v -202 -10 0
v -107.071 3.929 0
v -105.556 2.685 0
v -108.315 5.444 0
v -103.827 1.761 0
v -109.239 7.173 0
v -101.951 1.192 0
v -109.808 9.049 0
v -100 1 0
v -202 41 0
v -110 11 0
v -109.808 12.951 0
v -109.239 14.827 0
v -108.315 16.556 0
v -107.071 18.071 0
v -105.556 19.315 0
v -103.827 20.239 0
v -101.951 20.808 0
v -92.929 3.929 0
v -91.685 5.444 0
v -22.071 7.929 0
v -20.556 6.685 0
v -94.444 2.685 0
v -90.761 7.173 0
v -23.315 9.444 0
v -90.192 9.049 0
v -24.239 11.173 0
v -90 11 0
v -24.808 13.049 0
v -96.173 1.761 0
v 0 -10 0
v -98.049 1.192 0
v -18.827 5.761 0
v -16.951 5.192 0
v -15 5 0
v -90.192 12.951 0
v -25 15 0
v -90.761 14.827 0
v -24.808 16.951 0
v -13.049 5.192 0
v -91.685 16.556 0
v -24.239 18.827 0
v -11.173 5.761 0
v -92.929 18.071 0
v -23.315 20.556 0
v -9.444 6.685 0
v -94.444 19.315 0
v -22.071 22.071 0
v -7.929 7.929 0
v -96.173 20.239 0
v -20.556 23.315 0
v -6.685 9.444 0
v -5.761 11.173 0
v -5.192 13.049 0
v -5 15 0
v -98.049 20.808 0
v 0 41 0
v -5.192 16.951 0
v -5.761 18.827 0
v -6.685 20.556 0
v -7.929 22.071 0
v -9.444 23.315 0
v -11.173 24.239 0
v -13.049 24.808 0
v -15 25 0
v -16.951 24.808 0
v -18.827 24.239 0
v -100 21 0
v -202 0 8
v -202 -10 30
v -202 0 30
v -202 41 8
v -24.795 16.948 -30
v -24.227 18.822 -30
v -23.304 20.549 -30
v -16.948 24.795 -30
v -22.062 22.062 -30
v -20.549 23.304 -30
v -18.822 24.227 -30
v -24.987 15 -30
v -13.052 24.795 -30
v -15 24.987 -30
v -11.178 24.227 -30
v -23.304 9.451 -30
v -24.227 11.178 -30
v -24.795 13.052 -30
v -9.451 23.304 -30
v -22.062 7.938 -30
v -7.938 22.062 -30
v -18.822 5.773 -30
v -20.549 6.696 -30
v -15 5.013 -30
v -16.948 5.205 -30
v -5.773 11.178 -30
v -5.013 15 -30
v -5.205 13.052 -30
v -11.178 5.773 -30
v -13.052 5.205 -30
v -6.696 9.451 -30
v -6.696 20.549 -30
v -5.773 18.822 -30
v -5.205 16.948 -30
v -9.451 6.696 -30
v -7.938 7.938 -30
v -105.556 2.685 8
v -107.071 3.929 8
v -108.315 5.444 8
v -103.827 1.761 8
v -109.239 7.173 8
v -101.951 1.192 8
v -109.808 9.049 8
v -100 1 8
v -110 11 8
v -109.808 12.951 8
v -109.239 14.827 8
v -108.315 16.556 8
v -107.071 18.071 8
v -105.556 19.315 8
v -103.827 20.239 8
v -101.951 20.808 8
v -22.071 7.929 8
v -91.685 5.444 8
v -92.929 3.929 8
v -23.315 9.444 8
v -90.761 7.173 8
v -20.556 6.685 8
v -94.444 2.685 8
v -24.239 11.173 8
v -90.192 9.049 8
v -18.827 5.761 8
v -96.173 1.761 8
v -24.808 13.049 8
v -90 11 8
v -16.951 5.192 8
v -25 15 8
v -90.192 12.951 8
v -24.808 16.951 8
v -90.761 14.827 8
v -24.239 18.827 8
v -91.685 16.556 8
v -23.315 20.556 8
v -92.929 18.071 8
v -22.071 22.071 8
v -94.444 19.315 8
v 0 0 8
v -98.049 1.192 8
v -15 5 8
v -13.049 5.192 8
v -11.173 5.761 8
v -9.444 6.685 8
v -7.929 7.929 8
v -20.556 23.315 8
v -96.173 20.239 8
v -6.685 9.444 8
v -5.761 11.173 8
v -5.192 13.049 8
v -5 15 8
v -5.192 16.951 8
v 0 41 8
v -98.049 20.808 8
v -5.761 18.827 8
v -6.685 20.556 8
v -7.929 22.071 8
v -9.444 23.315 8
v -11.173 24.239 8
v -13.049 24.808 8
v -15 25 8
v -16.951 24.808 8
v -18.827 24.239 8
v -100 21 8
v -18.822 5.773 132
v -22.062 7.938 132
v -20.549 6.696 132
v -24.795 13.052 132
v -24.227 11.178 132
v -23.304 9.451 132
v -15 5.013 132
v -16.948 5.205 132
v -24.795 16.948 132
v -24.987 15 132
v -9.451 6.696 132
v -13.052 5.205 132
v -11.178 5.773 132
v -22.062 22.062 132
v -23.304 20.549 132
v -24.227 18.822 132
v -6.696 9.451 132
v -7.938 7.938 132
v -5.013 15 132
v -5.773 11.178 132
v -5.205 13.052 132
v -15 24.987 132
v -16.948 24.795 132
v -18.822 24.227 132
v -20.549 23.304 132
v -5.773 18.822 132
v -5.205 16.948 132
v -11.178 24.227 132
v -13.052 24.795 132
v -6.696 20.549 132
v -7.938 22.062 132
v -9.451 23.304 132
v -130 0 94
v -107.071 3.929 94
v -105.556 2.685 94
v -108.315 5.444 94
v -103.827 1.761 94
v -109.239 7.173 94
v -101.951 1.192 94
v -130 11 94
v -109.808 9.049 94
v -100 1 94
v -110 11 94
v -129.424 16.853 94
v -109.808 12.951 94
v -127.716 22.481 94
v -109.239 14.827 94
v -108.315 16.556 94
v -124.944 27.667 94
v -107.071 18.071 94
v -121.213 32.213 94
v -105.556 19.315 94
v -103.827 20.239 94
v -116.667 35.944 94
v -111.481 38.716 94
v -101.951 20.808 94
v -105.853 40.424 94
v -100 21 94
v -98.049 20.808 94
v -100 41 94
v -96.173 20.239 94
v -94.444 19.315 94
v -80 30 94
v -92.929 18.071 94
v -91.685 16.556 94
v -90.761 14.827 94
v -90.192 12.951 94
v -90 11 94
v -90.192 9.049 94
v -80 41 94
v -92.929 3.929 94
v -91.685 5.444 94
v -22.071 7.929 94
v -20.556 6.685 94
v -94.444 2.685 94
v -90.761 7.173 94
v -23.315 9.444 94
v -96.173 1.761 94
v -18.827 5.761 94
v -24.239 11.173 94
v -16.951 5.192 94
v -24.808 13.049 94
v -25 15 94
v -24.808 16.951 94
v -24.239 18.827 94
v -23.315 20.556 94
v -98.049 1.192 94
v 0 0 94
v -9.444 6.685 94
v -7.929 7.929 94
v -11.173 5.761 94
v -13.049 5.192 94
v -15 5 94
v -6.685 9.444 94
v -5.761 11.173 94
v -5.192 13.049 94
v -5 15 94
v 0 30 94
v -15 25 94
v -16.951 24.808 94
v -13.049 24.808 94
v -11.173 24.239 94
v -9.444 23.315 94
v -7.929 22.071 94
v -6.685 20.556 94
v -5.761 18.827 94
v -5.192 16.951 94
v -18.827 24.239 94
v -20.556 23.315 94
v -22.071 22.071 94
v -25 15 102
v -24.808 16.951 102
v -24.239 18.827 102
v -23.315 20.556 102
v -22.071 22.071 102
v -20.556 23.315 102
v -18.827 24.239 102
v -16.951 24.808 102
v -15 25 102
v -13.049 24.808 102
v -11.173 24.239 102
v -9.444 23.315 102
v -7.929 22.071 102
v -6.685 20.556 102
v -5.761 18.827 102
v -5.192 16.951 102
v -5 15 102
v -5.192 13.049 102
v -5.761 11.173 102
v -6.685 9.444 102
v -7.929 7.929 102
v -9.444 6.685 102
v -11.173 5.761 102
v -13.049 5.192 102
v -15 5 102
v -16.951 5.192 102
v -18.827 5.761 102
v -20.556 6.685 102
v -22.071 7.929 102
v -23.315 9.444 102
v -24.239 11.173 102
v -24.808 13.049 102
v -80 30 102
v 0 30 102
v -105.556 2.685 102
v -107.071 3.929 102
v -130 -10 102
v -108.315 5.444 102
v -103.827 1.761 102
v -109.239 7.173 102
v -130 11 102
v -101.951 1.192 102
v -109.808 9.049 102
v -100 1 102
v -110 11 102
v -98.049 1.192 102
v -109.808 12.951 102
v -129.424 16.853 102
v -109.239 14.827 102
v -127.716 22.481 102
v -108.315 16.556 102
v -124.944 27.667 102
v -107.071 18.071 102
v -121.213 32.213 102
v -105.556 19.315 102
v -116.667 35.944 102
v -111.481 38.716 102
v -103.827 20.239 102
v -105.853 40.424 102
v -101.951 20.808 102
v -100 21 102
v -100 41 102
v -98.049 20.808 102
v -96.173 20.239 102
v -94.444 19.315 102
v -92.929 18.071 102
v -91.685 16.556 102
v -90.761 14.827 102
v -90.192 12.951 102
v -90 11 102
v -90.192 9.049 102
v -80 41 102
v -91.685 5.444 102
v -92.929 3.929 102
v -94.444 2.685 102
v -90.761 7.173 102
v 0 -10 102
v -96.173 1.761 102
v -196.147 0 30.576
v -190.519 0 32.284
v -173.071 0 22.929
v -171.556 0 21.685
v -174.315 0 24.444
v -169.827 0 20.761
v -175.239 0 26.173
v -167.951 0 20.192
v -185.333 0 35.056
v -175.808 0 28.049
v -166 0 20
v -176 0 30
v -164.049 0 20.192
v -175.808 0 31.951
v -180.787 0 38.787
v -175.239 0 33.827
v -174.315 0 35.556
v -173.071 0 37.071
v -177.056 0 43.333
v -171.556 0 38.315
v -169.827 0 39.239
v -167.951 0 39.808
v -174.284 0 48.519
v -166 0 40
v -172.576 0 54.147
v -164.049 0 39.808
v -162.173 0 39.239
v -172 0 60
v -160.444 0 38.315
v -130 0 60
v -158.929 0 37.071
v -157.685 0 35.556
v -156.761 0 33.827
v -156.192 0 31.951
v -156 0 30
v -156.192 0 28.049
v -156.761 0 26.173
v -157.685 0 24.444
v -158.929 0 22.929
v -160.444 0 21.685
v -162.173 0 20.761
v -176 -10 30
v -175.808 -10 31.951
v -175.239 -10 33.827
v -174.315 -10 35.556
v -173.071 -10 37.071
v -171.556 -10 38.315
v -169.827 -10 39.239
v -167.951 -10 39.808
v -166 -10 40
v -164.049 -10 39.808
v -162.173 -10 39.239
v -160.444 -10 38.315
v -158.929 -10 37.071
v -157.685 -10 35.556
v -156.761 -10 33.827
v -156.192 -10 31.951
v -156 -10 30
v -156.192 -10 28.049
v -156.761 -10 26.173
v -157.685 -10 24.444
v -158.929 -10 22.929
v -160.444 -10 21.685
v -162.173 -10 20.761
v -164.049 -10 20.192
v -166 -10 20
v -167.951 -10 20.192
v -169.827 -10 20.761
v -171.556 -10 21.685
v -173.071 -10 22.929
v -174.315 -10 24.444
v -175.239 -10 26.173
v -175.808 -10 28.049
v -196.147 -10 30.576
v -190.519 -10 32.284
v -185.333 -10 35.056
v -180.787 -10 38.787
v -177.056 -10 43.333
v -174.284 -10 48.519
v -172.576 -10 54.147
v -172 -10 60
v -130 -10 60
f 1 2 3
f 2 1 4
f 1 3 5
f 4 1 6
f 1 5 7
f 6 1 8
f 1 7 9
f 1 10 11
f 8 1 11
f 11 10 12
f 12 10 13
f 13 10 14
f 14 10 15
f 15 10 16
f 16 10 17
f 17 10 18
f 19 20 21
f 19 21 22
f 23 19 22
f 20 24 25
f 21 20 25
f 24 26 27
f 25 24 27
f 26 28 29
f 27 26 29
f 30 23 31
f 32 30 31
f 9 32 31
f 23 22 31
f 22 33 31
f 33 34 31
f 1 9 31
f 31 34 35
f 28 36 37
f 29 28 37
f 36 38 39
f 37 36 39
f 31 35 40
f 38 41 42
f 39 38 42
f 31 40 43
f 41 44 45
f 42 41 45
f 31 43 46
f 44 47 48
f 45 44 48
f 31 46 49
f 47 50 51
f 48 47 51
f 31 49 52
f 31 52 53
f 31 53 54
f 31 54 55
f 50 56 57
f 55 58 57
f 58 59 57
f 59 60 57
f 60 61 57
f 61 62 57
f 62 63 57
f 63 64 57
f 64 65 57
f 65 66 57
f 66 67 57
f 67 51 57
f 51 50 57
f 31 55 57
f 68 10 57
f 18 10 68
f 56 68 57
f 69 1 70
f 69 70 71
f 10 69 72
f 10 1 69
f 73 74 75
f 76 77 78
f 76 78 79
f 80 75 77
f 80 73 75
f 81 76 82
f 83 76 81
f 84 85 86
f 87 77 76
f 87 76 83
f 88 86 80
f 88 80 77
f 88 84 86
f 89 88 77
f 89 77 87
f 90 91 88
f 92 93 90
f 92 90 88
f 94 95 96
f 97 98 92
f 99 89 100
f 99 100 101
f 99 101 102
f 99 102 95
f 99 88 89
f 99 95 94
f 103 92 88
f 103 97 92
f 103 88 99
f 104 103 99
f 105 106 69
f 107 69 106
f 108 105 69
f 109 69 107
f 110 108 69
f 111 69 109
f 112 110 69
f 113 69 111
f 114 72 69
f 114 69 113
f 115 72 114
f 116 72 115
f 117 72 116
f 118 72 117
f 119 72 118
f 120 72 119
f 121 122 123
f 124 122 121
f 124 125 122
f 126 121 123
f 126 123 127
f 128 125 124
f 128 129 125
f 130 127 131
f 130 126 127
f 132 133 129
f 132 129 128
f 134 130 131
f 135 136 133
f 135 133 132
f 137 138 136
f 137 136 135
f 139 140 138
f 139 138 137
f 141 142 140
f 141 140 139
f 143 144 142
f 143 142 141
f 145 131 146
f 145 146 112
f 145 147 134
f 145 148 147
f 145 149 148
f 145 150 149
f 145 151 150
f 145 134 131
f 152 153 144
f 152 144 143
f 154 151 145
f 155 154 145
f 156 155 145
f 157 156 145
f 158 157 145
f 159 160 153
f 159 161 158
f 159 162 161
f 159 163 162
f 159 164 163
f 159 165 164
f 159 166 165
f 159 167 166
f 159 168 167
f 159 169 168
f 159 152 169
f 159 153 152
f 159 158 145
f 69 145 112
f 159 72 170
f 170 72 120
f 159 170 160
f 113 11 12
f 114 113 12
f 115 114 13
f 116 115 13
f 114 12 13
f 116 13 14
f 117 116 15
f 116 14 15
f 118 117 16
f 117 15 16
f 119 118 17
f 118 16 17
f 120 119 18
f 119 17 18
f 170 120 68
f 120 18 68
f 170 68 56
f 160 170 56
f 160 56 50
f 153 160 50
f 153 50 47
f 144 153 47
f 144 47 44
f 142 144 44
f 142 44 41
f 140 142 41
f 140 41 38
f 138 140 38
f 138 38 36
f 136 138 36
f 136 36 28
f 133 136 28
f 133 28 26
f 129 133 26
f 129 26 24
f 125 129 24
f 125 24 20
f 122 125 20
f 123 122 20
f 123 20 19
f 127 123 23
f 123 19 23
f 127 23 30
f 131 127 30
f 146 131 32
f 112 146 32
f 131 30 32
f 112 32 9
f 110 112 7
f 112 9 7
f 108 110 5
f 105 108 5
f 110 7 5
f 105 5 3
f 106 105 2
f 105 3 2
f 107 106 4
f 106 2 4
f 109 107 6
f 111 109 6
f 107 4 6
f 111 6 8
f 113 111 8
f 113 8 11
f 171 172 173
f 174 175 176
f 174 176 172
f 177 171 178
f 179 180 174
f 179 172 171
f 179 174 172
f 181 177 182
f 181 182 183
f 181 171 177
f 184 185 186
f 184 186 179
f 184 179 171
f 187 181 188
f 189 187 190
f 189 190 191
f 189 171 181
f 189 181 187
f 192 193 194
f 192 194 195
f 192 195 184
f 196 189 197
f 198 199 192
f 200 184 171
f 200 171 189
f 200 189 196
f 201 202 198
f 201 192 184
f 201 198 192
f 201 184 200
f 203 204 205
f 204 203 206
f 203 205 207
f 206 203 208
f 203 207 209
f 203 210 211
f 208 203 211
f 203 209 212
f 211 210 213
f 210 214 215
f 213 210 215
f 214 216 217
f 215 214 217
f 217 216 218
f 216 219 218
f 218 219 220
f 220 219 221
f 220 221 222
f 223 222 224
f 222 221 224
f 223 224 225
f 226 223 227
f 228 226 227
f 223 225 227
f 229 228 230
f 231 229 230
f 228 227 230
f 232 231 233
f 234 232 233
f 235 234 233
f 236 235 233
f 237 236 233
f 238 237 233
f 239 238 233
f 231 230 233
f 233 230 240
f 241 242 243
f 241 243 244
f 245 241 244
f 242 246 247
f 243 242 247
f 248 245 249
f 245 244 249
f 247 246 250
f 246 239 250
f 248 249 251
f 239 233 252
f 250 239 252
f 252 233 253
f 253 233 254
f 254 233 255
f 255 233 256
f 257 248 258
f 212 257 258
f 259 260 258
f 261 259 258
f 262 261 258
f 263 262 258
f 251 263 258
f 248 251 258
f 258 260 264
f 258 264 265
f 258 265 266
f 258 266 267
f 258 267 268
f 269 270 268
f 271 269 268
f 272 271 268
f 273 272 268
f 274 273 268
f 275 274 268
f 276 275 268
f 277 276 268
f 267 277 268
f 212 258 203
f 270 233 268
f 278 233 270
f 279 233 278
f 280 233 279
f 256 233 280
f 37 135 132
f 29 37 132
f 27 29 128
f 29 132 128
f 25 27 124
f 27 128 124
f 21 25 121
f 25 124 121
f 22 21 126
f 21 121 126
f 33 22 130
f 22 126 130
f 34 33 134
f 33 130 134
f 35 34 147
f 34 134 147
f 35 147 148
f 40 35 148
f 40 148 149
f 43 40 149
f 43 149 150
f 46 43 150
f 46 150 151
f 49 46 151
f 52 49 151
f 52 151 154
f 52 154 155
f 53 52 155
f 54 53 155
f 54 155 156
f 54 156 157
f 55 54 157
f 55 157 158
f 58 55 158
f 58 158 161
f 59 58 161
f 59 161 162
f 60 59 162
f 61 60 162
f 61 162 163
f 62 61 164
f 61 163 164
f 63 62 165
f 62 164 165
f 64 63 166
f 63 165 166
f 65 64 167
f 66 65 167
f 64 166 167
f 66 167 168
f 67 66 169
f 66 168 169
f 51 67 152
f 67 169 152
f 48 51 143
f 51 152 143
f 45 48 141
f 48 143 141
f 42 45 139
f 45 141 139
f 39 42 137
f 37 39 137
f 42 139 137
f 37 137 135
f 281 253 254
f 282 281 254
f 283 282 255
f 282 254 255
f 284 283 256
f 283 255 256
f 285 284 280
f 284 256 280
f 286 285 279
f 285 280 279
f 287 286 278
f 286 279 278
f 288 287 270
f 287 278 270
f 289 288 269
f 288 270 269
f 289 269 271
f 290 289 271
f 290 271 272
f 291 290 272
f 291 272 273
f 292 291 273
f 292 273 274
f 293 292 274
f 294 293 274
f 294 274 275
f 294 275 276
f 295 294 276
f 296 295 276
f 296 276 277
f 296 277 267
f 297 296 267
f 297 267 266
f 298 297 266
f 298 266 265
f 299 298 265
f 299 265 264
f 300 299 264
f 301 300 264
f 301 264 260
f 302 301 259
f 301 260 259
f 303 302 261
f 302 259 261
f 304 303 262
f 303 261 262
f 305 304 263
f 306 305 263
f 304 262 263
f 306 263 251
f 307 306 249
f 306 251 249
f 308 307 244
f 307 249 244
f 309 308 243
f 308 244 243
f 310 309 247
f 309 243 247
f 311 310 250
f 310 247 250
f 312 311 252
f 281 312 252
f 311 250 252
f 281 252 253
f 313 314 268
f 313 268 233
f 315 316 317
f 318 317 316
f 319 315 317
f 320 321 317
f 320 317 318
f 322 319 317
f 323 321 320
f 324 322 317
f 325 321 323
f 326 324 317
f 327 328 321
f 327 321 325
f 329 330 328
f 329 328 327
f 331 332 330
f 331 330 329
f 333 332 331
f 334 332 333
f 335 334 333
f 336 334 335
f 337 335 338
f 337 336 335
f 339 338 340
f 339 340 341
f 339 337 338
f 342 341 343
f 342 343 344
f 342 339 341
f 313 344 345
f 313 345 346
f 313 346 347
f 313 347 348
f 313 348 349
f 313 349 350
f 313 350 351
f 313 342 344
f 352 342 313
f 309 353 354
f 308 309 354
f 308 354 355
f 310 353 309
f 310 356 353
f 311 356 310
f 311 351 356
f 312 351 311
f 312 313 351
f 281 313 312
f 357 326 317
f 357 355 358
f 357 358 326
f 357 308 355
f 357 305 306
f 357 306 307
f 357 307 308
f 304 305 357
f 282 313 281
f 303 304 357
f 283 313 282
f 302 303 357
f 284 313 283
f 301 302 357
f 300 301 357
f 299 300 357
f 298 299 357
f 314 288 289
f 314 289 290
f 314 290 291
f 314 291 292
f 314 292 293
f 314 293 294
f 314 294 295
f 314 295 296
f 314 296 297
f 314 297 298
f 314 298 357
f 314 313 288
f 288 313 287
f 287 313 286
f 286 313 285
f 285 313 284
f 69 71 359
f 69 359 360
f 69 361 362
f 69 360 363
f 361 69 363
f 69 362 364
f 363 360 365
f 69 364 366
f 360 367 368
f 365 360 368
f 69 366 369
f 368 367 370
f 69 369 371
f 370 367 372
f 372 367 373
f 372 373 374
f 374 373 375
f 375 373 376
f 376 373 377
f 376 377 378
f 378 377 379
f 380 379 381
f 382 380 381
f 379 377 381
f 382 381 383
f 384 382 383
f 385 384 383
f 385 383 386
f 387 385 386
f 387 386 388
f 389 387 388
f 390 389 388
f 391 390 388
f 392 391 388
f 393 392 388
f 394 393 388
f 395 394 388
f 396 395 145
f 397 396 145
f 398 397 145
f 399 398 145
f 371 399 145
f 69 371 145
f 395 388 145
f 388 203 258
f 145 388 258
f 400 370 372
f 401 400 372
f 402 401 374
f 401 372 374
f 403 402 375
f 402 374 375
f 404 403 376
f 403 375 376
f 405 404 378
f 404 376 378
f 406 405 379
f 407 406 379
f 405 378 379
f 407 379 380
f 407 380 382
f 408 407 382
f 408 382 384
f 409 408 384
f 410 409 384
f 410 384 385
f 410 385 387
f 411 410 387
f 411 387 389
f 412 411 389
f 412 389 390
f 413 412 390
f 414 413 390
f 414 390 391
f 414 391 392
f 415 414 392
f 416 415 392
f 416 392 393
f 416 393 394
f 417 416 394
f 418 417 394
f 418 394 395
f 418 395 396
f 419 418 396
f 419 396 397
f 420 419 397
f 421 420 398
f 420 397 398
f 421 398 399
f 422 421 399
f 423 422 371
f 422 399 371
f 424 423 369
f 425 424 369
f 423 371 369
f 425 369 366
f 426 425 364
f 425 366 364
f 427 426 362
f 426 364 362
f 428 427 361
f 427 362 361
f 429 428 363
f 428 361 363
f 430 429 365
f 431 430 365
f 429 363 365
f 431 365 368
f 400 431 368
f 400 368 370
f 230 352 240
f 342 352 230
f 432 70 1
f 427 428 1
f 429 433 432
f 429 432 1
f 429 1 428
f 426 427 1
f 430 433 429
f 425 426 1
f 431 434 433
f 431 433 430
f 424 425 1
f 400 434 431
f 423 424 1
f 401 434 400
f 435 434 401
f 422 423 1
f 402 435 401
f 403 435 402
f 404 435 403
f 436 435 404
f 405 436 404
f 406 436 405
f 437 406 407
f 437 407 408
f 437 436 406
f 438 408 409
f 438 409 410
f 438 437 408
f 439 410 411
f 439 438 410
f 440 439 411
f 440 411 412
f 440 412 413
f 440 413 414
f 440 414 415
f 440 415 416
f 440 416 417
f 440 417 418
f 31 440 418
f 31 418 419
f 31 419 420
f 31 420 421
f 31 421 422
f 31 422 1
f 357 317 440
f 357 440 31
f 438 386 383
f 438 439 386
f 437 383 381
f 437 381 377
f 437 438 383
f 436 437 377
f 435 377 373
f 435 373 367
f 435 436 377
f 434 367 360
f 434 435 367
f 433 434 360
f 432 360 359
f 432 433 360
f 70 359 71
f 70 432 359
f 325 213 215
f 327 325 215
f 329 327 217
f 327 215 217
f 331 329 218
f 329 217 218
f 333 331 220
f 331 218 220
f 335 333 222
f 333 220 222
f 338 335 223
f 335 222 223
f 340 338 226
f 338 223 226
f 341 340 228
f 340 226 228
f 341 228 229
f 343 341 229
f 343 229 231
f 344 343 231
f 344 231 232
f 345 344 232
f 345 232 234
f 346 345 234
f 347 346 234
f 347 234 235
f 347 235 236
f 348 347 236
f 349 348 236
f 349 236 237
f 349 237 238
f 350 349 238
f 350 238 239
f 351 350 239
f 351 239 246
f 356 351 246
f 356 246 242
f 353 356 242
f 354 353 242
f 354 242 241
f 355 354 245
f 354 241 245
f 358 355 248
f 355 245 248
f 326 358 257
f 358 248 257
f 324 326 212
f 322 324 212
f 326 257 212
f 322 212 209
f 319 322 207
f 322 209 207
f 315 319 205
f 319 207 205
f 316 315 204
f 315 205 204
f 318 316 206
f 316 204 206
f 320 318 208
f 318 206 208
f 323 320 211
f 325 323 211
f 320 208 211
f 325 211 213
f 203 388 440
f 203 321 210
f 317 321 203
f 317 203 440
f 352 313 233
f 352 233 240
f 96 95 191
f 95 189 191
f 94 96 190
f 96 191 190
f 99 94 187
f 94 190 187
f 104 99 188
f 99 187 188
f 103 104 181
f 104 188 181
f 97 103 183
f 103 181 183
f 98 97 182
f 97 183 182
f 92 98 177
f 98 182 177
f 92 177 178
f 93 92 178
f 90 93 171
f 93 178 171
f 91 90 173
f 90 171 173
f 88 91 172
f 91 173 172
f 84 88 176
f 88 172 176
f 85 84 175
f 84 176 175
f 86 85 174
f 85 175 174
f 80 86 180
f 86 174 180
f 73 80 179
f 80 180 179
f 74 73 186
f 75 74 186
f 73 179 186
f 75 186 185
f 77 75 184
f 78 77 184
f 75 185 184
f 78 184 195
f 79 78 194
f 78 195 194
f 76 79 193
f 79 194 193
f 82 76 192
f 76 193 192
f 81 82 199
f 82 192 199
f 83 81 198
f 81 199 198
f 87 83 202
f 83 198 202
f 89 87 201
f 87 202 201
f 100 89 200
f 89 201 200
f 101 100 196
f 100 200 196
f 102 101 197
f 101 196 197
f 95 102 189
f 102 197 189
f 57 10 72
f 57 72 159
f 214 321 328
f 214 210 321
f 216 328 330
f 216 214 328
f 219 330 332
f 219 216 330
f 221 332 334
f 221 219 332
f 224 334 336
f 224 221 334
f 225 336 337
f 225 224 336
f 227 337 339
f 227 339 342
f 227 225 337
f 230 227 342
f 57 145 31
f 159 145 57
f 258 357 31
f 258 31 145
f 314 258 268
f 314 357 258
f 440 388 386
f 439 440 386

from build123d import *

# Parameters (mm, degrees)
F1_DEPTH  = 10
F2_R      = 29.99999
F4_D      = 20
F5_W      = 202
F5_H      = 41
F6_DEPTH  = 8
F8_D      = 20
F10_DEPTH = 8
F11_R     = 30
F13_D     = 20
F14_D     = 20
F15_R     = 9.9871589088
F16_DEPTH = 30
F17_R     = 9.9871589088
F18_DEPTH = 132


# Not quite as in the source:
# - a fillet or chamfer is up to 0.001 mm smaller than in the source, because OpenCascade refuses the exact size


with BuildPart() as f1:
    # F0 (on Front) → F1 (new body)
    with BuildSketch(Plane.XZ):
        Polygon((-202, 0), (0, 0), (0, 102), (-130, 102), (-130, 60), (-172, 60), (-172, 30), (-202, 30), align=None)
    extrude(amount=F1_DEPTH)

    # F2 (radius 30 in the source; OpenCascade refuses exactly that, so slightly less here)
    f2_edges = [f1.edges().sort_by_distance(p)[0] for p in [
        (-172, -5, 30),
    ]]
    fillet(f2_edges, radius=F2_R)

    # F4 (through all)
    with Locations(Plane.XZ.offset(10)):
        with Locations((-166, 30)):
            Hole(F4_D / 2)

    # F5 (on Top) → F6 (join)
    with BuildSketch(Plane.XY):
        with Locations((-101, 20.5)):
            Rectangle(F5_W, F5_H)
    extrude(amount=F6_DEPTH)

    # F8 (through all)
    with Locations(Plane(origin=(0, 0, 0), x_dir=(1, 0, 0), z_dir=(0, 0, -1))):
        with Locations((-15, -15)):
            Hole(F8_D / 2)

    # F9 (on face) → F10 (join)
    with BuildSketch(Plane.XY.offset(102)):
        Polygon((-130, 0), (0, 0), (0, 30), (-80, 30), (-80, 41), (-130, 41), align=None)
    extrude(amount=-F10_DEPTH)

    # F11
    f11_edges = [f1.edges().sort_by_distance(p)[0] for p in [
        (-130, 41, 98),
    ]]
    fillet(f11_edges, radius=F11_R)

    # F13 (through all)
    with Locations(Plane.XY.offset(102)):
        with Locations((-100, 11)):
            Hole(F13_D / 2)

    # F14 (through all)
    with Locations(Plane.XY.offset(102)):
        with Locations((-15, 15)):
            Hole(F14_D / 2)


with BuildPart() as f16:
    # F15 (on face) → F16 (new body)
    with BuildSketch(Plane.XY.offset(102)):
        with Locations((-15, 15)):
            Circle(F15_R)
    extrude(amount=F16_DEPTH)

    # F17 (on face) → F18 (join)
    with BuildSketch(Plane(origin=(0, 0, 102), x_dir=(1, 0, 0), z_dir=(0, 0, -1))):
        with Locations((-15, -15)):
            Circle(F17_R)
    extrude(amount=F18_DEPTH)


solid = Compound([f1.part, f16.part])
